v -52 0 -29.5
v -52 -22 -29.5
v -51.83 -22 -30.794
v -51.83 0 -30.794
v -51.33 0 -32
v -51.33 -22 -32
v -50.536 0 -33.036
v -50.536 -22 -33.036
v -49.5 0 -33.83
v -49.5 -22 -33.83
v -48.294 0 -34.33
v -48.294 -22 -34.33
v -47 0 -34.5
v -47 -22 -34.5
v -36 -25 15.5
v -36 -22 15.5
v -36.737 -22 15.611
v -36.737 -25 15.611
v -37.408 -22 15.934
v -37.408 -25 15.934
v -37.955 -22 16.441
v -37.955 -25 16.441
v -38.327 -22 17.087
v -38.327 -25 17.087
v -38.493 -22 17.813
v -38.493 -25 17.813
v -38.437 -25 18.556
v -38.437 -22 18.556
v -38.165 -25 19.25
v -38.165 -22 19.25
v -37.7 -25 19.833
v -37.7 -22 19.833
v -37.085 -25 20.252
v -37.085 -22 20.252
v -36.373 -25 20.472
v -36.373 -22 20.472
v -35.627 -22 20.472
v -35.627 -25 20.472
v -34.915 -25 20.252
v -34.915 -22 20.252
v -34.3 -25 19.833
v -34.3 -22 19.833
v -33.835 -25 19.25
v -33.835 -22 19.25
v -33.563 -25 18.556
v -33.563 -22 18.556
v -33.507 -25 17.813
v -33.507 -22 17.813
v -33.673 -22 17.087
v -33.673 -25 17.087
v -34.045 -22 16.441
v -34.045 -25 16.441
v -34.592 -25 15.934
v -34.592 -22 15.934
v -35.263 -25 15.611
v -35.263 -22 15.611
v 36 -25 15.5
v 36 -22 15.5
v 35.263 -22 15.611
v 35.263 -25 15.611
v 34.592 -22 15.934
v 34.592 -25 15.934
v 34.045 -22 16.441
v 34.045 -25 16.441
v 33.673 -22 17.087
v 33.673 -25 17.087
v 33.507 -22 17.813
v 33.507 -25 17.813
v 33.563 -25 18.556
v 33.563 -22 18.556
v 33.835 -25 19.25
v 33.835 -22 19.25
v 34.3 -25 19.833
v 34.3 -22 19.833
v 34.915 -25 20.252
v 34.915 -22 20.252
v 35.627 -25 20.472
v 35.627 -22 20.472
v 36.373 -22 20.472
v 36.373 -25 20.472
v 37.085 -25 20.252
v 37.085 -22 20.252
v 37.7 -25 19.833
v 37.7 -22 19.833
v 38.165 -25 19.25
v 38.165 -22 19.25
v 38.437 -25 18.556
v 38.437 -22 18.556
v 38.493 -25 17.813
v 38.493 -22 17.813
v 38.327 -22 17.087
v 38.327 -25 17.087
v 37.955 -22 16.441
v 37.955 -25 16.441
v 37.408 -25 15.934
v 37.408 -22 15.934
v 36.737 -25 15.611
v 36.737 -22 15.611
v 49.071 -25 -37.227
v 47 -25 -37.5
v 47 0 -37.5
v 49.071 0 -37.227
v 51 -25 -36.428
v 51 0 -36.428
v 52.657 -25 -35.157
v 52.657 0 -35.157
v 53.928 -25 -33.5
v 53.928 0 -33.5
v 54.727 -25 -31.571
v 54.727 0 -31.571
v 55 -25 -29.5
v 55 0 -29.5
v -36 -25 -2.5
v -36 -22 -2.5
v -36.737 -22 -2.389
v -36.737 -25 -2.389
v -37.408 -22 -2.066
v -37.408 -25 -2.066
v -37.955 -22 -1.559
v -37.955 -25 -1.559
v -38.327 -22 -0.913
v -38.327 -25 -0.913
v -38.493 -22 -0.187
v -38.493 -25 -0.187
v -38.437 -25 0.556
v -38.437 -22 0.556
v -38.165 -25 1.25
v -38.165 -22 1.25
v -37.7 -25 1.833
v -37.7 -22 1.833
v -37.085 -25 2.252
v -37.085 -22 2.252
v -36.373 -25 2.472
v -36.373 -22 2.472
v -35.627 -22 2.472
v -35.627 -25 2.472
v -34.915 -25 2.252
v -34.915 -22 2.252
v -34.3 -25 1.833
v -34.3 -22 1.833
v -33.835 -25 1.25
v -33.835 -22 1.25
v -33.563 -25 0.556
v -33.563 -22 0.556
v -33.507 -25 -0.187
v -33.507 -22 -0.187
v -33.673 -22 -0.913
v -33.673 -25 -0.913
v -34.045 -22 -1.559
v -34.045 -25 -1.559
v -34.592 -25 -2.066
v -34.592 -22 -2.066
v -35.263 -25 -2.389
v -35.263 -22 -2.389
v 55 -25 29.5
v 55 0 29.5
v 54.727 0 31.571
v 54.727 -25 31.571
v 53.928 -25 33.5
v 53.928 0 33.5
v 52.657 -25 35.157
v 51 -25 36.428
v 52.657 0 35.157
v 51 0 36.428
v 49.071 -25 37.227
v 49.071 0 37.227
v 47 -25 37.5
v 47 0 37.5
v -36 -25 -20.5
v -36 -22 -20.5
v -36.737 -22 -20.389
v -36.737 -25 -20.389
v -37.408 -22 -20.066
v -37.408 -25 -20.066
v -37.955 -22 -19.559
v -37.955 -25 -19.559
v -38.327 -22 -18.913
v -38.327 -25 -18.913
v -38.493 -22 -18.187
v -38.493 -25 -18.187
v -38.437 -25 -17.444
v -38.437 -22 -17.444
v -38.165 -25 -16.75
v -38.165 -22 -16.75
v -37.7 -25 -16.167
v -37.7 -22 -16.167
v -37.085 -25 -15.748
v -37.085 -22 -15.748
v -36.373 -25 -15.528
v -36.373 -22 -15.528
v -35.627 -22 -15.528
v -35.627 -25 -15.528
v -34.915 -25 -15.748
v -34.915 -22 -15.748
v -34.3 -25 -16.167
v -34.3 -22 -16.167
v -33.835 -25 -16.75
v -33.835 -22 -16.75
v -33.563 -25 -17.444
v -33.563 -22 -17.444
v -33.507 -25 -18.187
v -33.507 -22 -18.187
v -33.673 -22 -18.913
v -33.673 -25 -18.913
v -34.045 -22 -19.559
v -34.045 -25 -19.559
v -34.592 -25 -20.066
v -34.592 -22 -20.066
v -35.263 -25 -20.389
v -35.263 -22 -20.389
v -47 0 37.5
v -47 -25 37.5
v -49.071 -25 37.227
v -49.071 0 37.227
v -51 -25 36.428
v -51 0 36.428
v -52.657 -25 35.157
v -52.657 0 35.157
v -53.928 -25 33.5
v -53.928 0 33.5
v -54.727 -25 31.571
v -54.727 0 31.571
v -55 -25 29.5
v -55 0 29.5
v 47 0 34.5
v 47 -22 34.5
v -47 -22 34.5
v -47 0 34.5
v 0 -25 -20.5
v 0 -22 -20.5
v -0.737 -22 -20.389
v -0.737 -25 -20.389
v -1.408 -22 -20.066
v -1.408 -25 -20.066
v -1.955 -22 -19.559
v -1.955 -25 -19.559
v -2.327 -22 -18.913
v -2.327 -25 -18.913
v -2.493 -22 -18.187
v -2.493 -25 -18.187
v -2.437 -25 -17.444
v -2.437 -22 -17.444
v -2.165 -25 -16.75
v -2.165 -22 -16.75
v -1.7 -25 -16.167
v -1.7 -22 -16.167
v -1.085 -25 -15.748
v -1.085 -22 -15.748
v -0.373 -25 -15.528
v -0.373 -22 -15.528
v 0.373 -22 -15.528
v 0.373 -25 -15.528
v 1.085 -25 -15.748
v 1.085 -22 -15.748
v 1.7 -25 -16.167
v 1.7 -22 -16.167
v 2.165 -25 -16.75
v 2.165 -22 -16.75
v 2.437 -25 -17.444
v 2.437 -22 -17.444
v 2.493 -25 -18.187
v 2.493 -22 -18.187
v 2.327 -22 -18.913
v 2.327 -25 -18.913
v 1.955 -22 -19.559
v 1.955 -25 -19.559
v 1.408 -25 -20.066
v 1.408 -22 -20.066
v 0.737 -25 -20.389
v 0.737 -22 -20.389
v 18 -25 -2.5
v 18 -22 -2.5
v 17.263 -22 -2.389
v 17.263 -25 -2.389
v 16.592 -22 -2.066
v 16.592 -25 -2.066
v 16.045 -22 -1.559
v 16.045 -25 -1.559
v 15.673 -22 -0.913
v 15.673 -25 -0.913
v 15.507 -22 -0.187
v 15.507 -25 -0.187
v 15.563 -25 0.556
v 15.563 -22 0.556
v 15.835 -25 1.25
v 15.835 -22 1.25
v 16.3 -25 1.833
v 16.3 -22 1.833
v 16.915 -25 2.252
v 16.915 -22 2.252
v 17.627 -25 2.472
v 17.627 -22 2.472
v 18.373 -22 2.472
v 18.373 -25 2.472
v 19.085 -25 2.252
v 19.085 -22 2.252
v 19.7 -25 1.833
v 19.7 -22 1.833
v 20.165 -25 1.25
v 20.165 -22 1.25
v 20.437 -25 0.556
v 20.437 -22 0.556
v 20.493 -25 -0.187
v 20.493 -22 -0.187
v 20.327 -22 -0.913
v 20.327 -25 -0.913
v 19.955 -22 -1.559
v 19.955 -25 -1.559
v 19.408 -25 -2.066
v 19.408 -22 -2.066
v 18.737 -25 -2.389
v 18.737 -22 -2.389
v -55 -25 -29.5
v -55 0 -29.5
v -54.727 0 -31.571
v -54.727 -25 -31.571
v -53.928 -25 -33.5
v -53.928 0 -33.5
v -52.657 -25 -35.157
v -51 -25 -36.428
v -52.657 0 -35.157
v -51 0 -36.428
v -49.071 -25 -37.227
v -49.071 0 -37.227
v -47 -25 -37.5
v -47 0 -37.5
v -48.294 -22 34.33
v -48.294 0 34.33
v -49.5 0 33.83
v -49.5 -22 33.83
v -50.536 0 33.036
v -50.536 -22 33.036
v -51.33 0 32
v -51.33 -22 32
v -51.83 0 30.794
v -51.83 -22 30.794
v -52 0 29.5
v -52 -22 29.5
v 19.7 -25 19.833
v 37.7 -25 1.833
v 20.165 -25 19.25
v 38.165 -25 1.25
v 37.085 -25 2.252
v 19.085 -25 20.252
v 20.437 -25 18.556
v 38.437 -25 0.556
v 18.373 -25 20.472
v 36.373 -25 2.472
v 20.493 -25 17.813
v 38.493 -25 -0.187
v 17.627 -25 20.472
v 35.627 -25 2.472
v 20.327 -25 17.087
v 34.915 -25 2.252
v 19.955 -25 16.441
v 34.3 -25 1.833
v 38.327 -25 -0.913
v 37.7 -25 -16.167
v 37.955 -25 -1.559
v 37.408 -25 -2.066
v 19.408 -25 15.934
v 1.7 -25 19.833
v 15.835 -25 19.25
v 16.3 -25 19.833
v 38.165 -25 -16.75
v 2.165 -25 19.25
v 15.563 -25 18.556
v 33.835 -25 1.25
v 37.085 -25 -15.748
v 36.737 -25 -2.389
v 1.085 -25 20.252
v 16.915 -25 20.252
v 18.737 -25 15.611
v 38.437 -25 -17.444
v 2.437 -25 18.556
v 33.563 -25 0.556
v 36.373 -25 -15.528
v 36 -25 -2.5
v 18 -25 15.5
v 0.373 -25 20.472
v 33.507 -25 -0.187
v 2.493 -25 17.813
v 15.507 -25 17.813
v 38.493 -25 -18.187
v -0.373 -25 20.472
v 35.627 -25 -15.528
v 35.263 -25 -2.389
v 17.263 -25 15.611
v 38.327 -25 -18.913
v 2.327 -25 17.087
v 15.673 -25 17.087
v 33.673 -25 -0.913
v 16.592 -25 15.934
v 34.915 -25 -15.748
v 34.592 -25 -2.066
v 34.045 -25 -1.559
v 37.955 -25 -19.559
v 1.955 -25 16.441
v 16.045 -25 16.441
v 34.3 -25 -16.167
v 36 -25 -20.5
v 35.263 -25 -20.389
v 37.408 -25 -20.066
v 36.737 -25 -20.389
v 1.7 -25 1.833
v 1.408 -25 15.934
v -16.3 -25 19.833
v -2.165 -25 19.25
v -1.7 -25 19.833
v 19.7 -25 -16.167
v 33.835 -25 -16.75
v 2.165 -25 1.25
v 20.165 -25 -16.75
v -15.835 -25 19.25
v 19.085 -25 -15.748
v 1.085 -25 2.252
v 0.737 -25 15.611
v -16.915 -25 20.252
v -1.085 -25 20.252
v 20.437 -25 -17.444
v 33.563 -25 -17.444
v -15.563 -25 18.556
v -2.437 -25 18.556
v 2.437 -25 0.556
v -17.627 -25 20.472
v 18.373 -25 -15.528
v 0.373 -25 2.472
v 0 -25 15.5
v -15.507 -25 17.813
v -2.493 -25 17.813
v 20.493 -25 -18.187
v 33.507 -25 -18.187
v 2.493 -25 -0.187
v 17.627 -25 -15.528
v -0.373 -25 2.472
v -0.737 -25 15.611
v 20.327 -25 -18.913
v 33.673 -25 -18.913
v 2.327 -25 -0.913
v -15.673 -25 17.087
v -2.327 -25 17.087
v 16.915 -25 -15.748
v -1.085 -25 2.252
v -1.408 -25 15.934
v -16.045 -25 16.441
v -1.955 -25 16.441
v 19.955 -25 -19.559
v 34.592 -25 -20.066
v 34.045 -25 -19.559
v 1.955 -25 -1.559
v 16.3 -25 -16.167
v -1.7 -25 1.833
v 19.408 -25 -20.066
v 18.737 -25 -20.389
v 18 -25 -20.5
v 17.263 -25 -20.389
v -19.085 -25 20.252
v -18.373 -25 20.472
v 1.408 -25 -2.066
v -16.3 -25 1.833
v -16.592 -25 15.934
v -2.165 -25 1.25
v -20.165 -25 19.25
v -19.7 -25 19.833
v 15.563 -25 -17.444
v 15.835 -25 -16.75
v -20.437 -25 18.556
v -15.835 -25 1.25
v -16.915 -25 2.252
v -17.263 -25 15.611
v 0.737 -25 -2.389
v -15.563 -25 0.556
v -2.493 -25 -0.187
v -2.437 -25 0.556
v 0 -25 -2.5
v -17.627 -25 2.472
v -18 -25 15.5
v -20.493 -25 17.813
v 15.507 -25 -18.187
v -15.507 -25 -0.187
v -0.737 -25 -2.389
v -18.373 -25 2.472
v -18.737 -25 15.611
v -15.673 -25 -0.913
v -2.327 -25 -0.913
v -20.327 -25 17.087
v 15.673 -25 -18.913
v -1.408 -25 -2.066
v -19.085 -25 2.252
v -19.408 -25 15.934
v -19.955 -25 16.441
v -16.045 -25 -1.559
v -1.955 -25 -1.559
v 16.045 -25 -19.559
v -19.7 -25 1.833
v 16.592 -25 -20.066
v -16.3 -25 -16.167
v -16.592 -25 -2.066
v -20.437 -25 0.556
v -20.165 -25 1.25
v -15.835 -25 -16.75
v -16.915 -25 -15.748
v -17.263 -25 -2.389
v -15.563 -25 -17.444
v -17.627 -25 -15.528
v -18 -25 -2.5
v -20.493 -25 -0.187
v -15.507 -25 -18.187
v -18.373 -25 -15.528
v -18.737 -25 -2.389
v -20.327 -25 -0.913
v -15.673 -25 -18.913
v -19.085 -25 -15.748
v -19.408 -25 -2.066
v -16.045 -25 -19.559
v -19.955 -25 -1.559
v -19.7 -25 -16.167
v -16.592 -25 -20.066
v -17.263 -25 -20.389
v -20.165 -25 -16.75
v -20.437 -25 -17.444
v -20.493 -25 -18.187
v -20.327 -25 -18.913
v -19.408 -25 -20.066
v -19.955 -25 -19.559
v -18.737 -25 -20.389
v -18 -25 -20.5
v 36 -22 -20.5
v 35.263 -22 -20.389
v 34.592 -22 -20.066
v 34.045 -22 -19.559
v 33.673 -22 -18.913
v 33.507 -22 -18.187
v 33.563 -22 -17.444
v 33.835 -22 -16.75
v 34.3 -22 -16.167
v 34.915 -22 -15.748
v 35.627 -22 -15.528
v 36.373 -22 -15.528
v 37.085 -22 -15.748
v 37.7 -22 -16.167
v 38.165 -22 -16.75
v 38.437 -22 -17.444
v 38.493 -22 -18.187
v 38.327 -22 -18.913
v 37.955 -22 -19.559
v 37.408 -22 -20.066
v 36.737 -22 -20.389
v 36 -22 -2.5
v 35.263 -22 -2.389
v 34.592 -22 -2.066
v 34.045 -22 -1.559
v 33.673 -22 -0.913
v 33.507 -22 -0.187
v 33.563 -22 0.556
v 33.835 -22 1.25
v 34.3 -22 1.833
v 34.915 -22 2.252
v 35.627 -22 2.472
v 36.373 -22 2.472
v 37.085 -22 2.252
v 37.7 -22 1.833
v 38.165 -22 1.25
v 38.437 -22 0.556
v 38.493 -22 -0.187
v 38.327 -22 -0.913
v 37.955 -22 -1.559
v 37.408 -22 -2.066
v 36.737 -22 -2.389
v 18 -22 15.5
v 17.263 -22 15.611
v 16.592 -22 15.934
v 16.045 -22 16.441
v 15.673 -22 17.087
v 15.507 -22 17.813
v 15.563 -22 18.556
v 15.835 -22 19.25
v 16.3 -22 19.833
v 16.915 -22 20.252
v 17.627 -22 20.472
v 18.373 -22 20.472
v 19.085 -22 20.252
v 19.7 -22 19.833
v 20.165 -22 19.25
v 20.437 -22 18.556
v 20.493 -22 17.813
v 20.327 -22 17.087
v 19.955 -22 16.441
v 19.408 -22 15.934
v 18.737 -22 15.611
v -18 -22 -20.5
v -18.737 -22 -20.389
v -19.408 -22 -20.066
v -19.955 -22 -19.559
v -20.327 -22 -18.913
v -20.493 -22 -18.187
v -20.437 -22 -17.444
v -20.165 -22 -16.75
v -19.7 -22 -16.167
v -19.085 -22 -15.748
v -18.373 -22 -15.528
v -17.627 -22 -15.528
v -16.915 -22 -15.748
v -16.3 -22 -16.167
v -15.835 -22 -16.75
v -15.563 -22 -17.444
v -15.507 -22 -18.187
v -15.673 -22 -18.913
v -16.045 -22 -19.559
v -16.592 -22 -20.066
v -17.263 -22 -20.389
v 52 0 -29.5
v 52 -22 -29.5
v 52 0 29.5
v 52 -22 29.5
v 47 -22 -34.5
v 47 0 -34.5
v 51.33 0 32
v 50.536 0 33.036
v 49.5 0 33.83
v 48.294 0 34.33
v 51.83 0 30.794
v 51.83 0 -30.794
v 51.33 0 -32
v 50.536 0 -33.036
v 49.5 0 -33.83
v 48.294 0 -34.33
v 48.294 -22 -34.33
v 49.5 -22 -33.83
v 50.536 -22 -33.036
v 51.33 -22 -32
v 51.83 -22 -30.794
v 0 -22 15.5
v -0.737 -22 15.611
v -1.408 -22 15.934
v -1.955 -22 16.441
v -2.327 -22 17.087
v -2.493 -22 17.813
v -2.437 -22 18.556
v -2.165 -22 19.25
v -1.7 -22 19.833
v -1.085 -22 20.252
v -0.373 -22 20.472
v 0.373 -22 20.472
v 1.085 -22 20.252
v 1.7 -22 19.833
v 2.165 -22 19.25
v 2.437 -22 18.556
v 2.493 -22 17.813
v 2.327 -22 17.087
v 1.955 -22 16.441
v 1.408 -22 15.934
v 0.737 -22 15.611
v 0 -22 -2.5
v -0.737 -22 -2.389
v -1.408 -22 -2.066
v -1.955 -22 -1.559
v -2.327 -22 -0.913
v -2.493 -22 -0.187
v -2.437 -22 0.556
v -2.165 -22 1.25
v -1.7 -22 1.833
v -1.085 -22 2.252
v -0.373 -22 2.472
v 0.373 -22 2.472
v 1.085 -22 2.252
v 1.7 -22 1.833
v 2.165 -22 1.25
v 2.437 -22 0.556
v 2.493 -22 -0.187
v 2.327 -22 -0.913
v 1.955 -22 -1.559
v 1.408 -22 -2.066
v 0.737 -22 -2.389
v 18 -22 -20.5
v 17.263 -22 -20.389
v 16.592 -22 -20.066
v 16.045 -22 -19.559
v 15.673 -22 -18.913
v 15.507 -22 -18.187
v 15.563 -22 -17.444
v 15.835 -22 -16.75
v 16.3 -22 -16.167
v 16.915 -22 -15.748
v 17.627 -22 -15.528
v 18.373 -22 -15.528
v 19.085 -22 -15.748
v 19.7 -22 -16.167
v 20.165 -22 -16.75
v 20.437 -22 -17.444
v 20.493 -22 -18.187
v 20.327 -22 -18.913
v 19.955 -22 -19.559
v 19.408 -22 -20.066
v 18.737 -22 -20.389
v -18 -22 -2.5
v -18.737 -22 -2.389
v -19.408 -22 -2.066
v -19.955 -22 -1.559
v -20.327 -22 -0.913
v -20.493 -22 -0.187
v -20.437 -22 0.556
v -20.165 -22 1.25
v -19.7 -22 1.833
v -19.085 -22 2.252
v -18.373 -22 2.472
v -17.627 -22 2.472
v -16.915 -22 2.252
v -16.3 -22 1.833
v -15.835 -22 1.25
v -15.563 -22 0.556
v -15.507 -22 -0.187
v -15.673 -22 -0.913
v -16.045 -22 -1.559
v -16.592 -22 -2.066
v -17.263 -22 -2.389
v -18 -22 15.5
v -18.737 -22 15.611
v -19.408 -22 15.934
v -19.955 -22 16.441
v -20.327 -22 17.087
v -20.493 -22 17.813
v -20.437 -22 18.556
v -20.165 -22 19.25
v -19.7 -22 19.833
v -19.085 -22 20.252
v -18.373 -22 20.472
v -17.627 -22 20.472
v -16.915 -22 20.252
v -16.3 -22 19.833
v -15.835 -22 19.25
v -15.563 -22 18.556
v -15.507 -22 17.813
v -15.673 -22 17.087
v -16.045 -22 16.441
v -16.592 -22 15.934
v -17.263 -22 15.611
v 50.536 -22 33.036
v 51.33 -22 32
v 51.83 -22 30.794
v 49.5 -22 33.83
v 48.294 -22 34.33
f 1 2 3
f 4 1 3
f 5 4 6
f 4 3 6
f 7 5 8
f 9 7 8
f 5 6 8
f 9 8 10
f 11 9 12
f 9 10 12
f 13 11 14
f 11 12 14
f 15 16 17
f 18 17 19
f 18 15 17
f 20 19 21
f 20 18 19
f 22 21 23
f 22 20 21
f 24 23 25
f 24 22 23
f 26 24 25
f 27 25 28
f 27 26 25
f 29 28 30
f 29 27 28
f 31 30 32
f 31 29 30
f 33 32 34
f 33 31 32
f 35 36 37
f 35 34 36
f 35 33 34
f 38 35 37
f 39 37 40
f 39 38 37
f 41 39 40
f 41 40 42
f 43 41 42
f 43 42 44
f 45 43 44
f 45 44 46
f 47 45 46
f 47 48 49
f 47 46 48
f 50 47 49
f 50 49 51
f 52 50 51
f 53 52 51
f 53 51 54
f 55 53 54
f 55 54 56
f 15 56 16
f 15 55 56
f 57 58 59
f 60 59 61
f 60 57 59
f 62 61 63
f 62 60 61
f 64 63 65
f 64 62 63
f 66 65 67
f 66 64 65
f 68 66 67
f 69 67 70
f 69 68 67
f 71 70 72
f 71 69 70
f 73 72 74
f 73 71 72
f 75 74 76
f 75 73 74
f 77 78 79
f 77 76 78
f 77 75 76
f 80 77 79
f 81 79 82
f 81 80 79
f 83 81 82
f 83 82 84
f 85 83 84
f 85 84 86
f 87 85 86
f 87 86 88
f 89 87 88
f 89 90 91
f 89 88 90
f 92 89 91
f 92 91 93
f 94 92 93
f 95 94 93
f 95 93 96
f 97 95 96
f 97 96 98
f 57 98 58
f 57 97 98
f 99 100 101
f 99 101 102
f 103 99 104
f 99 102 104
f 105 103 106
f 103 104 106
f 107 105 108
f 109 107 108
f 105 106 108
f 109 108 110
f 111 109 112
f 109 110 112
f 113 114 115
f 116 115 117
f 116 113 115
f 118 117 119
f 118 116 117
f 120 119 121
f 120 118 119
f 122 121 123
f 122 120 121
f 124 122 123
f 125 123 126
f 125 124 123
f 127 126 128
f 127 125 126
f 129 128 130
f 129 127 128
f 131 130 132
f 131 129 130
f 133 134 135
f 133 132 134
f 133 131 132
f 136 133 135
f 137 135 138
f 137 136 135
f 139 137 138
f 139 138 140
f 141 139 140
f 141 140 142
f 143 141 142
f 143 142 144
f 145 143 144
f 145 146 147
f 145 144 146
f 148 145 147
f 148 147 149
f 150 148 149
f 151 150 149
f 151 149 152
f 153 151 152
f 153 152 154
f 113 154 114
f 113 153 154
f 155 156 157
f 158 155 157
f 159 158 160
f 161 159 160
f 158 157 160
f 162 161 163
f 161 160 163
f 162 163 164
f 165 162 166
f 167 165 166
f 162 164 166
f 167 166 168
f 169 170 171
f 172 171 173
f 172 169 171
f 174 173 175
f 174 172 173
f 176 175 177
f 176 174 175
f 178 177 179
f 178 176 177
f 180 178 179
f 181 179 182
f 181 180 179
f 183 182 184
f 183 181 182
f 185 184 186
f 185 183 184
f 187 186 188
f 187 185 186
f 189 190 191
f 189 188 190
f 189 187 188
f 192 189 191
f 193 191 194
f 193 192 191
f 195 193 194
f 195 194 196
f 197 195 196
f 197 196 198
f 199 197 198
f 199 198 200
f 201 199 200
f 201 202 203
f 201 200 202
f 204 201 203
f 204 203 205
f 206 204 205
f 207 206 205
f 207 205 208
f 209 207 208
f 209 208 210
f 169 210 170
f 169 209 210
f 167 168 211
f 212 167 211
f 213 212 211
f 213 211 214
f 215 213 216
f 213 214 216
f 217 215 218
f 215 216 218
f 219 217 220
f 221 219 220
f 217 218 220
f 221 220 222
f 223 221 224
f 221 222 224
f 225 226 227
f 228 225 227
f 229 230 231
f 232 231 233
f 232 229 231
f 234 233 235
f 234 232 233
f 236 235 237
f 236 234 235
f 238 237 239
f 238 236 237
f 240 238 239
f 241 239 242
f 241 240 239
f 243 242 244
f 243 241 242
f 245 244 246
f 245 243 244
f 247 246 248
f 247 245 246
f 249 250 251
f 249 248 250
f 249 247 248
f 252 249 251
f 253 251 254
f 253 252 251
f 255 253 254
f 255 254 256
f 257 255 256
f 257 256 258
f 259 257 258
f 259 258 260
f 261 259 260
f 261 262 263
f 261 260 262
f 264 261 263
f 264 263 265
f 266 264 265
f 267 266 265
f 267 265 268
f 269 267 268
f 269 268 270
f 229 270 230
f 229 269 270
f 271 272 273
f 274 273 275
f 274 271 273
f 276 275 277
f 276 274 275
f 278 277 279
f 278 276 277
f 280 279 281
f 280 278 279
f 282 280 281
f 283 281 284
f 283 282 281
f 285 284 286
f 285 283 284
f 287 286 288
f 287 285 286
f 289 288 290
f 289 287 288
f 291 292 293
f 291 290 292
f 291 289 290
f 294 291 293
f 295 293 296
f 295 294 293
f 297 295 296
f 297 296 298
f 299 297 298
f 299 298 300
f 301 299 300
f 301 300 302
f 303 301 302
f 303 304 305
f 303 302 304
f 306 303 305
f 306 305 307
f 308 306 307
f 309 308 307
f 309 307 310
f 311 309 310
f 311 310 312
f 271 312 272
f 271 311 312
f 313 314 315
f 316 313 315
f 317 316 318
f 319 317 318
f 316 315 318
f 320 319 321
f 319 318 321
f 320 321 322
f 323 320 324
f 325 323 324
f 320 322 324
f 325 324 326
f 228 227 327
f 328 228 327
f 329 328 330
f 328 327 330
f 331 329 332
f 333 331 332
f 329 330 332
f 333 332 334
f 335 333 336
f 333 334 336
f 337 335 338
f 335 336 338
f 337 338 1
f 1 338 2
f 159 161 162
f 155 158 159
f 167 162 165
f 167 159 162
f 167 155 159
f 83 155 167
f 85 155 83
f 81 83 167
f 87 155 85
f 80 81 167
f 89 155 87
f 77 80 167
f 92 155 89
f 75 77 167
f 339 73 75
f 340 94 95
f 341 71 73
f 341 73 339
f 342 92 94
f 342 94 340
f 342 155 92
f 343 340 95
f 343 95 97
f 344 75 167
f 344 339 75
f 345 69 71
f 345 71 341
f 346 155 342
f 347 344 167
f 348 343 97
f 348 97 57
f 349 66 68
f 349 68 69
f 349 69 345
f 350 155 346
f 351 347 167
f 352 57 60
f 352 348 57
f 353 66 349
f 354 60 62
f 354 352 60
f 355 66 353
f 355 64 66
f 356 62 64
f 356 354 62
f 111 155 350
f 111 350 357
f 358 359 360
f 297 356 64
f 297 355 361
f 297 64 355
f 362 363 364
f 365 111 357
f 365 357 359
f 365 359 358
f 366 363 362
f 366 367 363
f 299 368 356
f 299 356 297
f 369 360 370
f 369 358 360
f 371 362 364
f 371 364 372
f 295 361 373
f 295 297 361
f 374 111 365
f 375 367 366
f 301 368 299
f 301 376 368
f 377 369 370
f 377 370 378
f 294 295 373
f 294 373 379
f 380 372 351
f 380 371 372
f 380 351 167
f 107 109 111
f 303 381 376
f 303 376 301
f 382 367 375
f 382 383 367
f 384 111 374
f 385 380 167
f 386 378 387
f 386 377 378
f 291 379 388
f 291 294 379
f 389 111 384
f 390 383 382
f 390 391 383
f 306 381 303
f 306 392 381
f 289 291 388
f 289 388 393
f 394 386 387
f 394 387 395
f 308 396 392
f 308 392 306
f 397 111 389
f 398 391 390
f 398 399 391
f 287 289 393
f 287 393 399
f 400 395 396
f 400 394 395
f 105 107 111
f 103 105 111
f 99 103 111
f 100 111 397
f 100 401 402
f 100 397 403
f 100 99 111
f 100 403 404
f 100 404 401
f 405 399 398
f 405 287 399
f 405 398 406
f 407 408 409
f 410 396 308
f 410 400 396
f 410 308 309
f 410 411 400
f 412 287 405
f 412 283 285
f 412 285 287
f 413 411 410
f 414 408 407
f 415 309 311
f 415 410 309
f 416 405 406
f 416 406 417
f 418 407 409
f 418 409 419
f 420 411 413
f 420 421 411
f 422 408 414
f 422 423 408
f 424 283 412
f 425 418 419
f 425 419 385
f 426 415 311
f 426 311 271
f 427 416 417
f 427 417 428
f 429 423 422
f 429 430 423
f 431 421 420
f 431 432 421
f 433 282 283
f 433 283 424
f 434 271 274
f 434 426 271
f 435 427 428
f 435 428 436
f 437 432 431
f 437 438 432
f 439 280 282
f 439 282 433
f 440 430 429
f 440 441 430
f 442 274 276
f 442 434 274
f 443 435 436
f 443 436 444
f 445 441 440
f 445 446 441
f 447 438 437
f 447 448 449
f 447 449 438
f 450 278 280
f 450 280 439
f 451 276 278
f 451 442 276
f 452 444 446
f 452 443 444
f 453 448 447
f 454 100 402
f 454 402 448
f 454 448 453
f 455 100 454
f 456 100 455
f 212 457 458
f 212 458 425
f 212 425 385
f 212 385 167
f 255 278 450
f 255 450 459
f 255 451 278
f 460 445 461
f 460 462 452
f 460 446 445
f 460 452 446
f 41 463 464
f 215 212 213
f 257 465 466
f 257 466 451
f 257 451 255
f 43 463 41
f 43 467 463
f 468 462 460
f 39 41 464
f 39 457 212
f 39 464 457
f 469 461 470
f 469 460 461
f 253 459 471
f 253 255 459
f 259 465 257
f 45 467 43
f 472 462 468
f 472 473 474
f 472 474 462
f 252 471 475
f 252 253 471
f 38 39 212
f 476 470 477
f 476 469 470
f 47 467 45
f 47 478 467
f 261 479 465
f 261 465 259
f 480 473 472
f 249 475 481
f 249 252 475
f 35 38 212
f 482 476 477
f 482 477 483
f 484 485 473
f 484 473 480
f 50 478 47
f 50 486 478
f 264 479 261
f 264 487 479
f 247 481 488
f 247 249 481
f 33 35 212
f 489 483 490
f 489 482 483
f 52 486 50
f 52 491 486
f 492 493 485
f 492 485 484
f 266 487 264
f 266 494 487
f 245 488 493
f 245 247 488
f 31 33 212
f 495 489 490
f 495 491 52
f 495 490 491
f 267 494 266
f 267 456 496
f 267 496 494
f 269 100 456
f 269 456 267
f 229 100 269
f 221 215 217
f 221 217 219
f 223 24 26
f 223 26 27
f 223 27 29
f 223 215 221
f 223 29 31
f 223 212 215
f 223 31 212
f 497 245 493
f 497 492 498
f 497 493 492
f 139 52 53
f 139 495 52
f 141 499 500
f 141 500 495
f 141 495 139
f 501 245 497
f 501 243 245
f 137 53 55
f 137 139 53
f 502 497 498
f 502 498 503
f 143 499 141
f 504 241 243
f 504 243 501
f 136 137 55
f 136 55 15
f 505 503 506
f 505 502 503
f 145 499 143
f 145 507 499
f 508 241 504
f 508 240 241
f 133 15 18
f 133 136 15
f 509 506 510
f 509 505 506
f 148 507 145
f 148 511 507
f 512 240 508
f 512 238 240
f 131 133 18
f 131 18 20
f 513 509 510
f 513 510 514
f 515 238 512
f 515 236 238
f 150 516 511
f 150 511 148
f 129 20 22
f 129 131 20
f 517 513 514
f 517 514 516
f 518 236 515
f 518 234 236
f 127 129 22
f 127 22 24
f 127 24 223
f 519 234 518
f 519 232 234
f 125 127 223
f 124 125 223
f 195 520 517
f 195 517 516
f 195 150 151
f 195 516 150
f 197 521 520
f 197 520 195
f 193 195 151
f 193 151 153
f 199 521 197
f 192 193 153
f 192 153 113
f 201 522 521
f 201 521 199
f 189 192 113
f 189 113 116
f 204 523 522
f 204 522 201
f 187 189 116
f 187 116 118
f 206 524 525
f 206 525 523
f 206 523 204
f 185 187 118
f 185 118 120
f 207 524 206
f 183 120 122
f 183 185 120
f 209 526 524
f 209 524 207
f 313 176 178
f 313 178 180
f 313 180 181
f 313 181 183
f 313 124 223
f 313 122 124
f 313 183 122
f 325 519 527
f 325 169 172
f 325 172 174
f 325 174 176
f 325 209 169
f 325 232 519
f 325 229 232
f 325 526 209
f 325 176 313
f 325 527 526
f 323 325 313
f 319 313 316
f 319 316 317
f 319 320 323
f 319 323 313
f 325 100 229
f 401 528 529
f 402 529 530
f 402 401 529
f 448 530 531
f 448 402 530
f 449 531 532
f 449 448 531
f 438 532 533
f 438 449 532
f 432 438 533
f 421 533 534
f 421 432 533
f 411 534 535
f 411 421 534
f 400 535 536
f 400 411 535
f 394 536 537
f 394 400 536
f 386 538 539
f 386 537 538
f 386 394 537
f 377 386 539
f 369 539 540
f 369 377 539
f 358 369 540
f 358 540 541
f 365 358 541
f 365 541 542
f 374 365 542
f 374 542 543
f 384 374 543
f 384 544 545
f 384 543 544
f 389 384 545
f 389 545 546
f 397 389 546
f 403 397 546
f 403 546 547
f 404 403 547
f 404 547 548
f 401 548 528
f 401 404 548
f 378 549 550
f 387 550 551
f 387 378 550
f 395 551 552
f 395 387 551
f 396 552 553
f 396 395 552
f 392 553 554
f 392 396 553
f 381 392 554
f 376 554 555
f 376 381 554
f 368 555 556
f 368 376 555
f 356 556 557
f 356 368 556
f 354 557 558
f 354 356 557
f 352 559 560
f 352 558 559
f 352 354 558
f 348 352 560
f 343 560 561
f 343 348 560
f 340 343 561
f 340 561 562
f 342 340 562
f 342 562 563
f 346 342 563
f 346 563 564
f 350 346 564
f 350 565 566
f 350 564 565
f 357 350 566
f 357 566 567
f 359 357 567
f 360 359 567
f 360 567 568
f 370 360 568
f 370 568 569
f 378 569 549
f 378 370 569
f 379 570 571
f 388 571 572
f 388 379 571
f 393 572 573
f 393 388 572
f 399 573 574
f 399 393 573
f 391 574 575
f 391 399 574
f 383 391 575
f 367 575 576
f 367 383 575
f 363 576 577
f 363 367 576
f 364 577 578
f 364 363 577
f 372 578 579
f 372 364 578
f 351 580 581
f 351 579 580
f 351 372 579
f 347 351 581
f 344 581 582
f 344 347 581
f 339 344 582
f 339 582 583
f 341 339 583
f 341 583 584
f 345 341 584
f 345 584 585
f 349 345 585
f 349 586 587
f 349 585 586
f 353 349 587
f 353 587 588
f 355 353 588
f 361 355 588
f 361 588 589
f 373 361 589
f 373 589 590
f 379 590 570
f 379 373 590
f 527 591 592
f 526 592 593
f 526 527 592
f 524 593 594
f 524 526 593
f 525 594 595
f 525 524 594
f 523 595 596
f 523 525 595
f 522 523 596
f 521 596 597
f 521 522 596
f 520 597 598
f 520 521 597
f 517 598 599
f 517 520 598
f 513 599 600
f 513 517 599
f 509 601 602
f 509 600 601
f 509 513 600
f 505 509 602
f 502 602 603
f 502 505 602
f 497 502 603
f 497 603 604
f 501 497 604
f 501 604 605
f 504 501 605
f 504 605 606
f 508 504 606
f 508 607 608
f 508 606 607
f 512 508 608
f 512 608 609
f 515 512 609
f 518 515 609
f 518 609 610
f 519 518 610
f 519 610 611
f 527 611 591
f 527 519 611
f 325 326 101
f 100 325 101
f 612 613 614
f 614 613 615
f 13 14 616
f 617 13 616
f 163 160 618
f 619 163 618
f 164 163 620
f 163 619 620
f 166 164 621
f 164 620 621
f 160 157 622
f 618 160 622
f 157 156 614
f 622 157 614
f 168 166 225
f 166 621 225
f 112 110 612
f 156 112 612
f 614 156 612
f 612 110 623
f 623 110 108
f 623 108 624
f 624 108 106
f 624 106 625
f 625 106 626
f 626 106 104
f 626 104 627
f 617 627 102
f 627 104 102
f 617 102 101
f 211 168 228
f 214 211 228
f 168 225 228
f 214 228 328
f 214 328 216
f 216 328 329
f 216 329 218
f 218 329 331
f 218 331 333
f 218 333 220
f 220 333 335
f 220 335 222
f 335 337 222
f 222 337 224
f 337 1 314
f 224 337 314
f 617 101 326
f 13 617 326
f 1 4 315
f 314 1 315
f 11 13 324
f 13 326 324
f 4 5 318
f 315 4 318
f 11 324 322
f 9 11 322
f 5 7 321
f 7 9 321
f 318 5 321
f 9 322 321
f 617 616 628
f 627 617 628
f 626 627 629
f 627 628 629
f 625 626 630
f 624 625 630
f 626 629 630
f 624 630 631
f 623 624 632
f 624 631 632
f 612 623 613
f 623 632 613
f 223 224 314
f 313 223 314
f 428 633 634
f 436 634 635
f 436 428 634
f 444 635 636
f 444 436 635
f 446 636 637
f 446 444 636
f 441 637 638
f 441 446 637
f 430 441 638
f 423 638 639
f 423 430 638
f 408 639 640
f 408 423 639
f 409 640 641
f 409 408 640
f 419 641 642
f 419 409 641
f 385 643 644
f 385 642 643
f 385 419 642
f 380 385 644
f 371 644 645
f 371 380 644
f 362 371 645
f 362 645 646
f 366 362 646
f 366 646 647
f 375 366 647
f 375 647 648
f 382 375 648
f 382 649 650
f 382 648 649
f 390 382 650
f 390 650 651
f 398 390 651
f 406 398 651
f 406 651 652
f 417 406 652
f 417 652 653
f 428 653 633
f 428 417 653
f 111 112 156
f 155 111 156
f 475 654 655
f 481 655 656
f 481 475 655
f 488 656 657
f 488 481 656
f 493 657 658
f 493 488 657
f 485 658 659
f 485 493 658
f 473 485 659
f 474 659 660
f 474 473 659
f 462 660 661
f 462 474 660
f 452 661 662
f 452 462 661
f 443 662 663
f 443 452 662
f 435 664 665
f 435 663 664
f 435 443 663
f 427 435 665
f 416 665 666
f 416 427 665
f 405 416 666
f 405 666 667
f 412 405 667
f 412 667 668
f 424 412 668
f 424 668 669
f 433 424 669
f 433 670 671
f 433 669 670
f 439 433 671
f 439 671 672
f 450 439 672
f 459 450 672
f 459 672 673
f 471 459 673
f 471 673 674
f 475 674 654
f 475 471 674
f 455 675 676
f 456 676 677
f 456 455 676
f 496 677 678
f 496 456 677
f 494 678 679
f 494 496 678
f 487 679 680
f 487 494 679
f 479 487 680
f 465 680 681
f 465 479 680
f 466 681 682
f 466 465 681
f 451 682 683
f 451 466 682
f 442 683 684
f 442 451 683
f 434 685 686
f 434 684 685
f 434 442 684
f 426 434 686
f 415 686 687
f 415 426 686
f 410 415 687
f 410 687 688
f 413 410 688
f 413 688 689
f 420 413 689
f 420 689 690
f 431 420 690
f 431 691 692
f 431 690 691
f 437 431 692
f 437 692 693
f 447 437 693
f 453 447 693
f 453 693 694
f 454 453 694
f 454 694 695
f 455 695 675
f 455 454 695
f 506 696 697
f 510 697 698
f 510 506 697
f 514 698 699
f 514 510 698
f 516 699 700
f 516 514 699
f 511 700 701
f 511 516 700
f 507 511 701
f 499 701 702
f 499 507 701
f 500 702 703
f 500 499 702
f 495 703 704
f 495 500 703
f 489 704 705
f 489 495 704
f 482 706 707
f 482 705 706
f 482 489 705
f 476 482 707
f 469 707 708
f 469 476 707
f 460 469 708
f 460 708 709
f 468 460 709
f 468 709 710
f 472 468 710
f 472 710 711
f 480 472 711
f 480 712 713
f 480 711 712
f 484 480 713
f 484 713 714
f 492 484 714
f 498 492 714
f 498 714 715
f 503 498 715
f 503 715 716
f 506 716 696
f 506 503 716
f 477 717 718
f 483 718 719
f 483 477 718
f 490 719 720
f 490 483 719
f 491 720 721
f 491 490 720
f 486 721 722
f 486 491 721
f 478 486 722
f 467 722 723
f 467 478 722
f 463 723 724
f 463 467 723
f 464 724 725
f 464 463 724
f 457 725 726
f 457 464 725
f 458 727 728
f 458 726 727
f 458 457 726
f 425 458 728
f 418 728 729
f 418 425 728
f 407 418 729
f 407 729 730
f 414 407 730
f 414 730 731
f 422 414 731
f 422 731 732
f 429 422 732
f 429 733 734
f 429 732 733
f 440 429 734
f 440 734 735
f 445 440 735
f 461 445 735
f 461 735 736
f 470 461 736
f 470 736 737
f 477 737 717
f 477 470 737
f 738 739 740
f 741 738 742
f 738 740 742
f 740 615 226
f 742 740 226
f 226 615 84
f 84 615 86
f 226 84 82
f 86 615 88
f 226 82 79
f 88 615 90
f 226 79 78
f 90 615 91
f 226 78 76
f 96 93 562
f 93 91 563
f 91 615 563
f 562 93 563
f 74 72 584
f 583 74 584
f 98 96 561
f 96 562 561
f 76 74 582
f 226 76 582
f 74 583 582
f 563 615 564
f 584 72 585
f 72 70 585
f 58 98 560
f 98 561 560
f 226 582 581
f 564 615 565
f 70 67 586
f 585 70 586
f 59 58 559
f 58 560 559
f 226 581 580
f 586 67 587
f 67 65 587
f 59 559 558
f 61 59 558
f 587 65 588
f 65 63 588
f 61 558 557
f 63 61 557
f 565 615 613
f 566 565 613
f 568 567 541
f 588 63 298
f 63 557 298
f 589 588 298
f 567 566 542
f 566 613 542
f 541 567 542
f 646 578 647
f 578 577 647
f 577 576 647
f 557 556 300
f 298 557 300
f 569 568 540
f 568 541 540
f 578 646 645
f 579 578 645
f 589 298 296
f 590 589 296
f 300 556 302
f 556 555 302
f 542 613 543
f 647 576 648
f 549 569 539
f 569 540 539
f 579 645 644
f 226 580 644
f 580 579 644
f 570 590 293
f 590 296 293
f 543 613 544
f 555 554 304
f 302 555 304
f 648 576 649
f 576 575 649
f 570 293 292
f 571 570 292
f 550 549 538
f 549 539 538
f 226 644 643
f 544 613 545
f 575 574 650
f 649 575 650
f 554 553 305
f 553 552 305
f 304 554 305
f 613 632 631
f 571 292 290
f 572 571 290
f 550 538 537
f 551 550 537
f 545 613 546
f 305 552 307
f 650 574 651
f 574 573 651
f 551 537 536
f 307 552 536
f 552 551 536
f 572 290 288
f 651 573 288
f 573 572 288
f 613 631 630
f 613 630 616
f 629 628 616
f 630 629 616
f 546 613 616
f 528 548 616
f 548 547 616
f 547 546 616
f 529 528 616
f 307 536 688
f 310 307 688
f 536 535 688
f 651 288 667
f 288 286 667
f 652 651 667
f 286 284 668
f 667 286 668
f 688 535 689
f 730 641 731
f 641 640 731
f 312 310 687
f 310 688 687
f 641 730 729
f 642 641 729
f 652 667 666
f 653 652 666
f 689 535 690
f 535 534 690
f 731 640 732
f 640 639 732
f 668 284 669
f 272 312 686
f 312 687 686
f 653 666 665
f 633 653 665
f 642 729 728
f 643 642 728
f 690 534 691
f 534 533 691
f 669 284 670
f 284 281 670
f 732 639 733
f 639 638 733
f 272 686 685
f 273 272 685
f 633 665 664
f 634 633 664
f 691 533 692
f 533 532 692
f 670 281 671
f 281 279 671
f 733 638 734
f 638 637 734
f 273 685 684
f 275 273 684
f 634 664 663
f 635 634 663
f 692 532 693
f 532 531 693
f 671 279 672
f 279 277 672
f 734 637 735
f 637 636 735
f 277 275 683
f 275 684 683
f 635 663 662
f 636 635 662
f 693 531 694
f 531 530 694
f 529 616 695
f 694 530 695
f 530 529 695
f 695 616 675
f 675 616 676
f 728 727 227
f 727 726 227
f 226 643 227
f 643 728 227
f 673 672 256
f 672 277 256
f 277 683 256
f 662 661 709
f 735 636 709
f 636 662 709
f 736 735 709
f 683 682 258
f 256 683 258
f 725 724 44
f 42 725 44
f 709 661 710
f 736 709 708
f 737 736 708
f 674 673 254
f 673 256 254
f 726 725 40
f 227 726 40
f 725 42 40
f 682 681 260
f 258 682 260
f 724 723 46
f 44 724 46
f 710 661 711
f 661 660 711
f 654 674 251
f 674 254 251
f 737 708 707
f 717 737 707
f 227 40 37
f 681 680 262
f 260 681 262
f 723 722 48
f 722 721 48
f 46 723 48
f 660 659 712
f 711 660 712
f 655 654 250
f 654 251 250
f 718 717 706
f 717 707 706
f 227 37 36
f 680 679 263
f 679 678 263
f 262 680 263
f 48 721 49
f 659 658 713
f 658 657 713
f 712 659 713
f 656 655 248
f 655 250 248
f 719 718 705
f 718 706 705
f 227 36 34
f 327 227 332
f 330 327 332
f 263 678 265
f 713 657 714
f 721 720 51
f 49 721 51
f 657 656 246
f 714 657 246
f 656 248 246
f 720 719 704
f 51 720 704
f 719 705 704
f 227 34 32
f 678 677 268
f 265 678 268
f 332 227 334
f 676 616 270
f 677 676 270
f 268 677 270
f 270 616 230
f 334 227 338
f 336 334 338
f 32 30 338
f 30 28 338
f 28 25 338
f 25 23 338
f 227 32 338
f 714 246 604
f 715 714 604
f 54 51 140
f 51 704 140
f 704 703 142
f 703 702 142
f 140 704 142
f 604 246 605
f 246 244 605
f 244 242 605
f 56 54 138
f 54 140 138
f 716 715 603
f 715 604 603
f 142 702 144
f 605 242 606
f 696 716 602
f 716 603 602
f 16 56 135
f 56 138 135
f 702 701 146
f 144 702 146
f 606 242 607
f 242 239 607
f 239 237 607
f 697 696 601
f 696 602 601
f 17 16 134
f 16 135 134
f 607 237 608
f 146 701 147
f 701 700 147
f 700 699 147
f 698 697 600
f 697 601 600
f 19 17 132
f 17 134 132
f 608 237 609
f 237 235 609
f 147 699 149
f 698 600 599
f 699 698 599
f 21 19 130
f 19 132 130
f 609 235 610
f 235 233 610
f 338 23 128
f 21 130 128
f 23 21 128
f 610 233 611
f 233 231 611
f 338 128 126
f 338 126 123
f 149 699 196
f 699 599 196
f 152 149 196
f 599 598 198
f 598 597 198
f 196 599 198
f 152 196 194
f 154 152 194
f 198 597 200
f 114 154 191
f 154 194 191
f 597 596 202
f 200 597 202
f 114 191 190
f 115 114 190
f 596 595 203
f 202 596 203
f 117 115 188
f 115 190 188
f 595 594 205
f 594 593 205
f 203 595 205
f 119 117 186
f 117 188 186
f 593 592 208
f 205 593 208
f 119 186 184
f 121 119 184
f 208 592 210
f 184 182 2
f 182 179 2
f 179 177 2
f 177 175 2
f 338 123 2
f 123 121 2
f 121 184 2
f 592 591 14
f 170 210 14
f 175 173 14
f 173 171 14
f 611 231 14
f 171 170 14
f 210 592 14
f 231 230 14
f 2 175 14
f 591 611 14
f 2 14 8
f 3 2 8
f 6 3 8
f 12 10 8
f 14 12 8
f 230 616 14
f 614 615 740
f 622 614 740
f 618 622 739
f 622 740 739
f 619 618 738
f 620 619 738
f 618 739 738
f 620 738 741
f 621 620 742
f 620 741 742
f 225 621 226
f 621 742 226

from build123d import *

# Parameters (mm, degrees)
EXTRUDE_1_DEPTH     = 25
CUT_EXTRUDE_1_DEPTH = 22
SKETCH_3_R          = 2.5
CUT_EXTRUDE_2_DEPTH = 72.107313267


with BuildPart() as part:
    # 草图1 → 凸台-拉伸1 (new body)
    with BuildSketch(Plane(origin=(0, 0, 0), x_dir=(1, 0, 0), z_dir=(0, 1, 0))):
        with BuildLine():
            Line((-47, 37.5), (47, 37.5))
            ThreePointArc((47, 37.5), (52.656854249, 35.156854249), (55, 29.5))
            Line((55, 29.5), (55, -29.5))
            ThreePointArc((55, -29.5), (52.656854249, -35.156854249), (47, -37.5))
            Line((47, -37.5), (-47, -37.5))
            ThreePointArc((-47, -37.5), (-52.656854249, -35.156854249), (-55, -29.5))
            Line((-55, -29.5), (-55, 29.5))
            ThreePointArc((-55, 29.5), (-52.656854249, 35.156854249), (-47, 37.5))
        make_face()
    extrude(amount=-EXTRUDE_1_DEPTH)

    # 草图2 → 切除-拉伸1 (cut)
    with BuildSketch(Plane(origin=(0, -22, 0), x_dir=(1, 0, 0), z_dir=(0, 1, 0))):
        with BuildLine():
            Line((-47, 34.5), (47, 34.5))
            ThreePointArc((47, 34.5), (50.535533906, 33.035533906), (52, 29.5))
            Line((52, 29.5), (52, -29.5))
            ThreePointArc((52, -29.5), (50.535533906, -33.035533906), (47, -34.5))
            Line((47, -34.5), (-47, -34.5))
            ThreePointArc((-47, -34.5), (-50.535533906, -33.035533906), (-52, -29.5))
            Line((-52, -29.5), (-52, 29.5))
            ThreePointArc((-52, 29.5), (-50.535533906, 33.035533906), (-47, 34.5))
        make_face()
    extrude(amount=CUT_EXTRUDE_1_DEPTH, mode=Mode.SUBTRACT)

    # 草图3 → 切除-拉伸2 (cut, through all)
    with BuildSketch(Plane(origin=(0, -25, 0), x_dir=(1, 0, 0), z_dir=(0, 1, 0))):
        with Locations(Location((-36, 18, 0), (0, 0, 90))):
            Circle(SKETCH_3_R)
        with Locations(Location((-18, 18, 0), (0, 0, 90))):
            Circle(SKETCH_3_R)
        with Locations(Location((0, 18, 0), (0, 0, 90))):
            Circle(SKETCH_3_R)
        with Locations(Location((18, 18, 0), (0, 0, 90))):
            Circle(SKETCH_3_R)
        with Locations(Location((36, 18, 0), (0, 0, 90))):
            Circle(SKETCH_3_R)
        with Locations(Location((-36, 0, 0), (0, 0, 90))):
            Circle(SKETCH_3_R)
        with Locations(Location((-18, 0, 0), (0, 0, 90))):
            Circle(SKETCH_3_R)
        with Locations(Location((0, 0, 0), (0, 0, 90))):
            Circle(SKETCH_3_R)
        with Locations(Location((18, 0, 0), (0, 0, 90))):
            Circle(SKETCH_3_R)
        with Locations(Location((36, 0, 0), (0, 0, 90))):
            Circle(SKETCH_3_R)
        with Locations(Location((-36, -18, 0), (0, 0, 90))):
            Circle(SKETCH_3_R)
        with Locations(Location((-18, -18, 0), (0, 0, 90))):
            Circle(SKETCH_3_R)
        with Locations(Location((0, -18, 0), (0, 0, 90))):
            Circle(SKETCH_3_R)
        with Locations(Location((18, -18, 0), (0, 0, 90))):
            Circle(SKETCH_3_R)
        with Locations(Location((36, -18, 0), (0, 0, 90))):
            Circle(SKETCH_3_R)
    extrude(amount=CUT_EXTRUDE_2_DEPTH, mode=Mode.SUBTRACT)


solid = part.part
